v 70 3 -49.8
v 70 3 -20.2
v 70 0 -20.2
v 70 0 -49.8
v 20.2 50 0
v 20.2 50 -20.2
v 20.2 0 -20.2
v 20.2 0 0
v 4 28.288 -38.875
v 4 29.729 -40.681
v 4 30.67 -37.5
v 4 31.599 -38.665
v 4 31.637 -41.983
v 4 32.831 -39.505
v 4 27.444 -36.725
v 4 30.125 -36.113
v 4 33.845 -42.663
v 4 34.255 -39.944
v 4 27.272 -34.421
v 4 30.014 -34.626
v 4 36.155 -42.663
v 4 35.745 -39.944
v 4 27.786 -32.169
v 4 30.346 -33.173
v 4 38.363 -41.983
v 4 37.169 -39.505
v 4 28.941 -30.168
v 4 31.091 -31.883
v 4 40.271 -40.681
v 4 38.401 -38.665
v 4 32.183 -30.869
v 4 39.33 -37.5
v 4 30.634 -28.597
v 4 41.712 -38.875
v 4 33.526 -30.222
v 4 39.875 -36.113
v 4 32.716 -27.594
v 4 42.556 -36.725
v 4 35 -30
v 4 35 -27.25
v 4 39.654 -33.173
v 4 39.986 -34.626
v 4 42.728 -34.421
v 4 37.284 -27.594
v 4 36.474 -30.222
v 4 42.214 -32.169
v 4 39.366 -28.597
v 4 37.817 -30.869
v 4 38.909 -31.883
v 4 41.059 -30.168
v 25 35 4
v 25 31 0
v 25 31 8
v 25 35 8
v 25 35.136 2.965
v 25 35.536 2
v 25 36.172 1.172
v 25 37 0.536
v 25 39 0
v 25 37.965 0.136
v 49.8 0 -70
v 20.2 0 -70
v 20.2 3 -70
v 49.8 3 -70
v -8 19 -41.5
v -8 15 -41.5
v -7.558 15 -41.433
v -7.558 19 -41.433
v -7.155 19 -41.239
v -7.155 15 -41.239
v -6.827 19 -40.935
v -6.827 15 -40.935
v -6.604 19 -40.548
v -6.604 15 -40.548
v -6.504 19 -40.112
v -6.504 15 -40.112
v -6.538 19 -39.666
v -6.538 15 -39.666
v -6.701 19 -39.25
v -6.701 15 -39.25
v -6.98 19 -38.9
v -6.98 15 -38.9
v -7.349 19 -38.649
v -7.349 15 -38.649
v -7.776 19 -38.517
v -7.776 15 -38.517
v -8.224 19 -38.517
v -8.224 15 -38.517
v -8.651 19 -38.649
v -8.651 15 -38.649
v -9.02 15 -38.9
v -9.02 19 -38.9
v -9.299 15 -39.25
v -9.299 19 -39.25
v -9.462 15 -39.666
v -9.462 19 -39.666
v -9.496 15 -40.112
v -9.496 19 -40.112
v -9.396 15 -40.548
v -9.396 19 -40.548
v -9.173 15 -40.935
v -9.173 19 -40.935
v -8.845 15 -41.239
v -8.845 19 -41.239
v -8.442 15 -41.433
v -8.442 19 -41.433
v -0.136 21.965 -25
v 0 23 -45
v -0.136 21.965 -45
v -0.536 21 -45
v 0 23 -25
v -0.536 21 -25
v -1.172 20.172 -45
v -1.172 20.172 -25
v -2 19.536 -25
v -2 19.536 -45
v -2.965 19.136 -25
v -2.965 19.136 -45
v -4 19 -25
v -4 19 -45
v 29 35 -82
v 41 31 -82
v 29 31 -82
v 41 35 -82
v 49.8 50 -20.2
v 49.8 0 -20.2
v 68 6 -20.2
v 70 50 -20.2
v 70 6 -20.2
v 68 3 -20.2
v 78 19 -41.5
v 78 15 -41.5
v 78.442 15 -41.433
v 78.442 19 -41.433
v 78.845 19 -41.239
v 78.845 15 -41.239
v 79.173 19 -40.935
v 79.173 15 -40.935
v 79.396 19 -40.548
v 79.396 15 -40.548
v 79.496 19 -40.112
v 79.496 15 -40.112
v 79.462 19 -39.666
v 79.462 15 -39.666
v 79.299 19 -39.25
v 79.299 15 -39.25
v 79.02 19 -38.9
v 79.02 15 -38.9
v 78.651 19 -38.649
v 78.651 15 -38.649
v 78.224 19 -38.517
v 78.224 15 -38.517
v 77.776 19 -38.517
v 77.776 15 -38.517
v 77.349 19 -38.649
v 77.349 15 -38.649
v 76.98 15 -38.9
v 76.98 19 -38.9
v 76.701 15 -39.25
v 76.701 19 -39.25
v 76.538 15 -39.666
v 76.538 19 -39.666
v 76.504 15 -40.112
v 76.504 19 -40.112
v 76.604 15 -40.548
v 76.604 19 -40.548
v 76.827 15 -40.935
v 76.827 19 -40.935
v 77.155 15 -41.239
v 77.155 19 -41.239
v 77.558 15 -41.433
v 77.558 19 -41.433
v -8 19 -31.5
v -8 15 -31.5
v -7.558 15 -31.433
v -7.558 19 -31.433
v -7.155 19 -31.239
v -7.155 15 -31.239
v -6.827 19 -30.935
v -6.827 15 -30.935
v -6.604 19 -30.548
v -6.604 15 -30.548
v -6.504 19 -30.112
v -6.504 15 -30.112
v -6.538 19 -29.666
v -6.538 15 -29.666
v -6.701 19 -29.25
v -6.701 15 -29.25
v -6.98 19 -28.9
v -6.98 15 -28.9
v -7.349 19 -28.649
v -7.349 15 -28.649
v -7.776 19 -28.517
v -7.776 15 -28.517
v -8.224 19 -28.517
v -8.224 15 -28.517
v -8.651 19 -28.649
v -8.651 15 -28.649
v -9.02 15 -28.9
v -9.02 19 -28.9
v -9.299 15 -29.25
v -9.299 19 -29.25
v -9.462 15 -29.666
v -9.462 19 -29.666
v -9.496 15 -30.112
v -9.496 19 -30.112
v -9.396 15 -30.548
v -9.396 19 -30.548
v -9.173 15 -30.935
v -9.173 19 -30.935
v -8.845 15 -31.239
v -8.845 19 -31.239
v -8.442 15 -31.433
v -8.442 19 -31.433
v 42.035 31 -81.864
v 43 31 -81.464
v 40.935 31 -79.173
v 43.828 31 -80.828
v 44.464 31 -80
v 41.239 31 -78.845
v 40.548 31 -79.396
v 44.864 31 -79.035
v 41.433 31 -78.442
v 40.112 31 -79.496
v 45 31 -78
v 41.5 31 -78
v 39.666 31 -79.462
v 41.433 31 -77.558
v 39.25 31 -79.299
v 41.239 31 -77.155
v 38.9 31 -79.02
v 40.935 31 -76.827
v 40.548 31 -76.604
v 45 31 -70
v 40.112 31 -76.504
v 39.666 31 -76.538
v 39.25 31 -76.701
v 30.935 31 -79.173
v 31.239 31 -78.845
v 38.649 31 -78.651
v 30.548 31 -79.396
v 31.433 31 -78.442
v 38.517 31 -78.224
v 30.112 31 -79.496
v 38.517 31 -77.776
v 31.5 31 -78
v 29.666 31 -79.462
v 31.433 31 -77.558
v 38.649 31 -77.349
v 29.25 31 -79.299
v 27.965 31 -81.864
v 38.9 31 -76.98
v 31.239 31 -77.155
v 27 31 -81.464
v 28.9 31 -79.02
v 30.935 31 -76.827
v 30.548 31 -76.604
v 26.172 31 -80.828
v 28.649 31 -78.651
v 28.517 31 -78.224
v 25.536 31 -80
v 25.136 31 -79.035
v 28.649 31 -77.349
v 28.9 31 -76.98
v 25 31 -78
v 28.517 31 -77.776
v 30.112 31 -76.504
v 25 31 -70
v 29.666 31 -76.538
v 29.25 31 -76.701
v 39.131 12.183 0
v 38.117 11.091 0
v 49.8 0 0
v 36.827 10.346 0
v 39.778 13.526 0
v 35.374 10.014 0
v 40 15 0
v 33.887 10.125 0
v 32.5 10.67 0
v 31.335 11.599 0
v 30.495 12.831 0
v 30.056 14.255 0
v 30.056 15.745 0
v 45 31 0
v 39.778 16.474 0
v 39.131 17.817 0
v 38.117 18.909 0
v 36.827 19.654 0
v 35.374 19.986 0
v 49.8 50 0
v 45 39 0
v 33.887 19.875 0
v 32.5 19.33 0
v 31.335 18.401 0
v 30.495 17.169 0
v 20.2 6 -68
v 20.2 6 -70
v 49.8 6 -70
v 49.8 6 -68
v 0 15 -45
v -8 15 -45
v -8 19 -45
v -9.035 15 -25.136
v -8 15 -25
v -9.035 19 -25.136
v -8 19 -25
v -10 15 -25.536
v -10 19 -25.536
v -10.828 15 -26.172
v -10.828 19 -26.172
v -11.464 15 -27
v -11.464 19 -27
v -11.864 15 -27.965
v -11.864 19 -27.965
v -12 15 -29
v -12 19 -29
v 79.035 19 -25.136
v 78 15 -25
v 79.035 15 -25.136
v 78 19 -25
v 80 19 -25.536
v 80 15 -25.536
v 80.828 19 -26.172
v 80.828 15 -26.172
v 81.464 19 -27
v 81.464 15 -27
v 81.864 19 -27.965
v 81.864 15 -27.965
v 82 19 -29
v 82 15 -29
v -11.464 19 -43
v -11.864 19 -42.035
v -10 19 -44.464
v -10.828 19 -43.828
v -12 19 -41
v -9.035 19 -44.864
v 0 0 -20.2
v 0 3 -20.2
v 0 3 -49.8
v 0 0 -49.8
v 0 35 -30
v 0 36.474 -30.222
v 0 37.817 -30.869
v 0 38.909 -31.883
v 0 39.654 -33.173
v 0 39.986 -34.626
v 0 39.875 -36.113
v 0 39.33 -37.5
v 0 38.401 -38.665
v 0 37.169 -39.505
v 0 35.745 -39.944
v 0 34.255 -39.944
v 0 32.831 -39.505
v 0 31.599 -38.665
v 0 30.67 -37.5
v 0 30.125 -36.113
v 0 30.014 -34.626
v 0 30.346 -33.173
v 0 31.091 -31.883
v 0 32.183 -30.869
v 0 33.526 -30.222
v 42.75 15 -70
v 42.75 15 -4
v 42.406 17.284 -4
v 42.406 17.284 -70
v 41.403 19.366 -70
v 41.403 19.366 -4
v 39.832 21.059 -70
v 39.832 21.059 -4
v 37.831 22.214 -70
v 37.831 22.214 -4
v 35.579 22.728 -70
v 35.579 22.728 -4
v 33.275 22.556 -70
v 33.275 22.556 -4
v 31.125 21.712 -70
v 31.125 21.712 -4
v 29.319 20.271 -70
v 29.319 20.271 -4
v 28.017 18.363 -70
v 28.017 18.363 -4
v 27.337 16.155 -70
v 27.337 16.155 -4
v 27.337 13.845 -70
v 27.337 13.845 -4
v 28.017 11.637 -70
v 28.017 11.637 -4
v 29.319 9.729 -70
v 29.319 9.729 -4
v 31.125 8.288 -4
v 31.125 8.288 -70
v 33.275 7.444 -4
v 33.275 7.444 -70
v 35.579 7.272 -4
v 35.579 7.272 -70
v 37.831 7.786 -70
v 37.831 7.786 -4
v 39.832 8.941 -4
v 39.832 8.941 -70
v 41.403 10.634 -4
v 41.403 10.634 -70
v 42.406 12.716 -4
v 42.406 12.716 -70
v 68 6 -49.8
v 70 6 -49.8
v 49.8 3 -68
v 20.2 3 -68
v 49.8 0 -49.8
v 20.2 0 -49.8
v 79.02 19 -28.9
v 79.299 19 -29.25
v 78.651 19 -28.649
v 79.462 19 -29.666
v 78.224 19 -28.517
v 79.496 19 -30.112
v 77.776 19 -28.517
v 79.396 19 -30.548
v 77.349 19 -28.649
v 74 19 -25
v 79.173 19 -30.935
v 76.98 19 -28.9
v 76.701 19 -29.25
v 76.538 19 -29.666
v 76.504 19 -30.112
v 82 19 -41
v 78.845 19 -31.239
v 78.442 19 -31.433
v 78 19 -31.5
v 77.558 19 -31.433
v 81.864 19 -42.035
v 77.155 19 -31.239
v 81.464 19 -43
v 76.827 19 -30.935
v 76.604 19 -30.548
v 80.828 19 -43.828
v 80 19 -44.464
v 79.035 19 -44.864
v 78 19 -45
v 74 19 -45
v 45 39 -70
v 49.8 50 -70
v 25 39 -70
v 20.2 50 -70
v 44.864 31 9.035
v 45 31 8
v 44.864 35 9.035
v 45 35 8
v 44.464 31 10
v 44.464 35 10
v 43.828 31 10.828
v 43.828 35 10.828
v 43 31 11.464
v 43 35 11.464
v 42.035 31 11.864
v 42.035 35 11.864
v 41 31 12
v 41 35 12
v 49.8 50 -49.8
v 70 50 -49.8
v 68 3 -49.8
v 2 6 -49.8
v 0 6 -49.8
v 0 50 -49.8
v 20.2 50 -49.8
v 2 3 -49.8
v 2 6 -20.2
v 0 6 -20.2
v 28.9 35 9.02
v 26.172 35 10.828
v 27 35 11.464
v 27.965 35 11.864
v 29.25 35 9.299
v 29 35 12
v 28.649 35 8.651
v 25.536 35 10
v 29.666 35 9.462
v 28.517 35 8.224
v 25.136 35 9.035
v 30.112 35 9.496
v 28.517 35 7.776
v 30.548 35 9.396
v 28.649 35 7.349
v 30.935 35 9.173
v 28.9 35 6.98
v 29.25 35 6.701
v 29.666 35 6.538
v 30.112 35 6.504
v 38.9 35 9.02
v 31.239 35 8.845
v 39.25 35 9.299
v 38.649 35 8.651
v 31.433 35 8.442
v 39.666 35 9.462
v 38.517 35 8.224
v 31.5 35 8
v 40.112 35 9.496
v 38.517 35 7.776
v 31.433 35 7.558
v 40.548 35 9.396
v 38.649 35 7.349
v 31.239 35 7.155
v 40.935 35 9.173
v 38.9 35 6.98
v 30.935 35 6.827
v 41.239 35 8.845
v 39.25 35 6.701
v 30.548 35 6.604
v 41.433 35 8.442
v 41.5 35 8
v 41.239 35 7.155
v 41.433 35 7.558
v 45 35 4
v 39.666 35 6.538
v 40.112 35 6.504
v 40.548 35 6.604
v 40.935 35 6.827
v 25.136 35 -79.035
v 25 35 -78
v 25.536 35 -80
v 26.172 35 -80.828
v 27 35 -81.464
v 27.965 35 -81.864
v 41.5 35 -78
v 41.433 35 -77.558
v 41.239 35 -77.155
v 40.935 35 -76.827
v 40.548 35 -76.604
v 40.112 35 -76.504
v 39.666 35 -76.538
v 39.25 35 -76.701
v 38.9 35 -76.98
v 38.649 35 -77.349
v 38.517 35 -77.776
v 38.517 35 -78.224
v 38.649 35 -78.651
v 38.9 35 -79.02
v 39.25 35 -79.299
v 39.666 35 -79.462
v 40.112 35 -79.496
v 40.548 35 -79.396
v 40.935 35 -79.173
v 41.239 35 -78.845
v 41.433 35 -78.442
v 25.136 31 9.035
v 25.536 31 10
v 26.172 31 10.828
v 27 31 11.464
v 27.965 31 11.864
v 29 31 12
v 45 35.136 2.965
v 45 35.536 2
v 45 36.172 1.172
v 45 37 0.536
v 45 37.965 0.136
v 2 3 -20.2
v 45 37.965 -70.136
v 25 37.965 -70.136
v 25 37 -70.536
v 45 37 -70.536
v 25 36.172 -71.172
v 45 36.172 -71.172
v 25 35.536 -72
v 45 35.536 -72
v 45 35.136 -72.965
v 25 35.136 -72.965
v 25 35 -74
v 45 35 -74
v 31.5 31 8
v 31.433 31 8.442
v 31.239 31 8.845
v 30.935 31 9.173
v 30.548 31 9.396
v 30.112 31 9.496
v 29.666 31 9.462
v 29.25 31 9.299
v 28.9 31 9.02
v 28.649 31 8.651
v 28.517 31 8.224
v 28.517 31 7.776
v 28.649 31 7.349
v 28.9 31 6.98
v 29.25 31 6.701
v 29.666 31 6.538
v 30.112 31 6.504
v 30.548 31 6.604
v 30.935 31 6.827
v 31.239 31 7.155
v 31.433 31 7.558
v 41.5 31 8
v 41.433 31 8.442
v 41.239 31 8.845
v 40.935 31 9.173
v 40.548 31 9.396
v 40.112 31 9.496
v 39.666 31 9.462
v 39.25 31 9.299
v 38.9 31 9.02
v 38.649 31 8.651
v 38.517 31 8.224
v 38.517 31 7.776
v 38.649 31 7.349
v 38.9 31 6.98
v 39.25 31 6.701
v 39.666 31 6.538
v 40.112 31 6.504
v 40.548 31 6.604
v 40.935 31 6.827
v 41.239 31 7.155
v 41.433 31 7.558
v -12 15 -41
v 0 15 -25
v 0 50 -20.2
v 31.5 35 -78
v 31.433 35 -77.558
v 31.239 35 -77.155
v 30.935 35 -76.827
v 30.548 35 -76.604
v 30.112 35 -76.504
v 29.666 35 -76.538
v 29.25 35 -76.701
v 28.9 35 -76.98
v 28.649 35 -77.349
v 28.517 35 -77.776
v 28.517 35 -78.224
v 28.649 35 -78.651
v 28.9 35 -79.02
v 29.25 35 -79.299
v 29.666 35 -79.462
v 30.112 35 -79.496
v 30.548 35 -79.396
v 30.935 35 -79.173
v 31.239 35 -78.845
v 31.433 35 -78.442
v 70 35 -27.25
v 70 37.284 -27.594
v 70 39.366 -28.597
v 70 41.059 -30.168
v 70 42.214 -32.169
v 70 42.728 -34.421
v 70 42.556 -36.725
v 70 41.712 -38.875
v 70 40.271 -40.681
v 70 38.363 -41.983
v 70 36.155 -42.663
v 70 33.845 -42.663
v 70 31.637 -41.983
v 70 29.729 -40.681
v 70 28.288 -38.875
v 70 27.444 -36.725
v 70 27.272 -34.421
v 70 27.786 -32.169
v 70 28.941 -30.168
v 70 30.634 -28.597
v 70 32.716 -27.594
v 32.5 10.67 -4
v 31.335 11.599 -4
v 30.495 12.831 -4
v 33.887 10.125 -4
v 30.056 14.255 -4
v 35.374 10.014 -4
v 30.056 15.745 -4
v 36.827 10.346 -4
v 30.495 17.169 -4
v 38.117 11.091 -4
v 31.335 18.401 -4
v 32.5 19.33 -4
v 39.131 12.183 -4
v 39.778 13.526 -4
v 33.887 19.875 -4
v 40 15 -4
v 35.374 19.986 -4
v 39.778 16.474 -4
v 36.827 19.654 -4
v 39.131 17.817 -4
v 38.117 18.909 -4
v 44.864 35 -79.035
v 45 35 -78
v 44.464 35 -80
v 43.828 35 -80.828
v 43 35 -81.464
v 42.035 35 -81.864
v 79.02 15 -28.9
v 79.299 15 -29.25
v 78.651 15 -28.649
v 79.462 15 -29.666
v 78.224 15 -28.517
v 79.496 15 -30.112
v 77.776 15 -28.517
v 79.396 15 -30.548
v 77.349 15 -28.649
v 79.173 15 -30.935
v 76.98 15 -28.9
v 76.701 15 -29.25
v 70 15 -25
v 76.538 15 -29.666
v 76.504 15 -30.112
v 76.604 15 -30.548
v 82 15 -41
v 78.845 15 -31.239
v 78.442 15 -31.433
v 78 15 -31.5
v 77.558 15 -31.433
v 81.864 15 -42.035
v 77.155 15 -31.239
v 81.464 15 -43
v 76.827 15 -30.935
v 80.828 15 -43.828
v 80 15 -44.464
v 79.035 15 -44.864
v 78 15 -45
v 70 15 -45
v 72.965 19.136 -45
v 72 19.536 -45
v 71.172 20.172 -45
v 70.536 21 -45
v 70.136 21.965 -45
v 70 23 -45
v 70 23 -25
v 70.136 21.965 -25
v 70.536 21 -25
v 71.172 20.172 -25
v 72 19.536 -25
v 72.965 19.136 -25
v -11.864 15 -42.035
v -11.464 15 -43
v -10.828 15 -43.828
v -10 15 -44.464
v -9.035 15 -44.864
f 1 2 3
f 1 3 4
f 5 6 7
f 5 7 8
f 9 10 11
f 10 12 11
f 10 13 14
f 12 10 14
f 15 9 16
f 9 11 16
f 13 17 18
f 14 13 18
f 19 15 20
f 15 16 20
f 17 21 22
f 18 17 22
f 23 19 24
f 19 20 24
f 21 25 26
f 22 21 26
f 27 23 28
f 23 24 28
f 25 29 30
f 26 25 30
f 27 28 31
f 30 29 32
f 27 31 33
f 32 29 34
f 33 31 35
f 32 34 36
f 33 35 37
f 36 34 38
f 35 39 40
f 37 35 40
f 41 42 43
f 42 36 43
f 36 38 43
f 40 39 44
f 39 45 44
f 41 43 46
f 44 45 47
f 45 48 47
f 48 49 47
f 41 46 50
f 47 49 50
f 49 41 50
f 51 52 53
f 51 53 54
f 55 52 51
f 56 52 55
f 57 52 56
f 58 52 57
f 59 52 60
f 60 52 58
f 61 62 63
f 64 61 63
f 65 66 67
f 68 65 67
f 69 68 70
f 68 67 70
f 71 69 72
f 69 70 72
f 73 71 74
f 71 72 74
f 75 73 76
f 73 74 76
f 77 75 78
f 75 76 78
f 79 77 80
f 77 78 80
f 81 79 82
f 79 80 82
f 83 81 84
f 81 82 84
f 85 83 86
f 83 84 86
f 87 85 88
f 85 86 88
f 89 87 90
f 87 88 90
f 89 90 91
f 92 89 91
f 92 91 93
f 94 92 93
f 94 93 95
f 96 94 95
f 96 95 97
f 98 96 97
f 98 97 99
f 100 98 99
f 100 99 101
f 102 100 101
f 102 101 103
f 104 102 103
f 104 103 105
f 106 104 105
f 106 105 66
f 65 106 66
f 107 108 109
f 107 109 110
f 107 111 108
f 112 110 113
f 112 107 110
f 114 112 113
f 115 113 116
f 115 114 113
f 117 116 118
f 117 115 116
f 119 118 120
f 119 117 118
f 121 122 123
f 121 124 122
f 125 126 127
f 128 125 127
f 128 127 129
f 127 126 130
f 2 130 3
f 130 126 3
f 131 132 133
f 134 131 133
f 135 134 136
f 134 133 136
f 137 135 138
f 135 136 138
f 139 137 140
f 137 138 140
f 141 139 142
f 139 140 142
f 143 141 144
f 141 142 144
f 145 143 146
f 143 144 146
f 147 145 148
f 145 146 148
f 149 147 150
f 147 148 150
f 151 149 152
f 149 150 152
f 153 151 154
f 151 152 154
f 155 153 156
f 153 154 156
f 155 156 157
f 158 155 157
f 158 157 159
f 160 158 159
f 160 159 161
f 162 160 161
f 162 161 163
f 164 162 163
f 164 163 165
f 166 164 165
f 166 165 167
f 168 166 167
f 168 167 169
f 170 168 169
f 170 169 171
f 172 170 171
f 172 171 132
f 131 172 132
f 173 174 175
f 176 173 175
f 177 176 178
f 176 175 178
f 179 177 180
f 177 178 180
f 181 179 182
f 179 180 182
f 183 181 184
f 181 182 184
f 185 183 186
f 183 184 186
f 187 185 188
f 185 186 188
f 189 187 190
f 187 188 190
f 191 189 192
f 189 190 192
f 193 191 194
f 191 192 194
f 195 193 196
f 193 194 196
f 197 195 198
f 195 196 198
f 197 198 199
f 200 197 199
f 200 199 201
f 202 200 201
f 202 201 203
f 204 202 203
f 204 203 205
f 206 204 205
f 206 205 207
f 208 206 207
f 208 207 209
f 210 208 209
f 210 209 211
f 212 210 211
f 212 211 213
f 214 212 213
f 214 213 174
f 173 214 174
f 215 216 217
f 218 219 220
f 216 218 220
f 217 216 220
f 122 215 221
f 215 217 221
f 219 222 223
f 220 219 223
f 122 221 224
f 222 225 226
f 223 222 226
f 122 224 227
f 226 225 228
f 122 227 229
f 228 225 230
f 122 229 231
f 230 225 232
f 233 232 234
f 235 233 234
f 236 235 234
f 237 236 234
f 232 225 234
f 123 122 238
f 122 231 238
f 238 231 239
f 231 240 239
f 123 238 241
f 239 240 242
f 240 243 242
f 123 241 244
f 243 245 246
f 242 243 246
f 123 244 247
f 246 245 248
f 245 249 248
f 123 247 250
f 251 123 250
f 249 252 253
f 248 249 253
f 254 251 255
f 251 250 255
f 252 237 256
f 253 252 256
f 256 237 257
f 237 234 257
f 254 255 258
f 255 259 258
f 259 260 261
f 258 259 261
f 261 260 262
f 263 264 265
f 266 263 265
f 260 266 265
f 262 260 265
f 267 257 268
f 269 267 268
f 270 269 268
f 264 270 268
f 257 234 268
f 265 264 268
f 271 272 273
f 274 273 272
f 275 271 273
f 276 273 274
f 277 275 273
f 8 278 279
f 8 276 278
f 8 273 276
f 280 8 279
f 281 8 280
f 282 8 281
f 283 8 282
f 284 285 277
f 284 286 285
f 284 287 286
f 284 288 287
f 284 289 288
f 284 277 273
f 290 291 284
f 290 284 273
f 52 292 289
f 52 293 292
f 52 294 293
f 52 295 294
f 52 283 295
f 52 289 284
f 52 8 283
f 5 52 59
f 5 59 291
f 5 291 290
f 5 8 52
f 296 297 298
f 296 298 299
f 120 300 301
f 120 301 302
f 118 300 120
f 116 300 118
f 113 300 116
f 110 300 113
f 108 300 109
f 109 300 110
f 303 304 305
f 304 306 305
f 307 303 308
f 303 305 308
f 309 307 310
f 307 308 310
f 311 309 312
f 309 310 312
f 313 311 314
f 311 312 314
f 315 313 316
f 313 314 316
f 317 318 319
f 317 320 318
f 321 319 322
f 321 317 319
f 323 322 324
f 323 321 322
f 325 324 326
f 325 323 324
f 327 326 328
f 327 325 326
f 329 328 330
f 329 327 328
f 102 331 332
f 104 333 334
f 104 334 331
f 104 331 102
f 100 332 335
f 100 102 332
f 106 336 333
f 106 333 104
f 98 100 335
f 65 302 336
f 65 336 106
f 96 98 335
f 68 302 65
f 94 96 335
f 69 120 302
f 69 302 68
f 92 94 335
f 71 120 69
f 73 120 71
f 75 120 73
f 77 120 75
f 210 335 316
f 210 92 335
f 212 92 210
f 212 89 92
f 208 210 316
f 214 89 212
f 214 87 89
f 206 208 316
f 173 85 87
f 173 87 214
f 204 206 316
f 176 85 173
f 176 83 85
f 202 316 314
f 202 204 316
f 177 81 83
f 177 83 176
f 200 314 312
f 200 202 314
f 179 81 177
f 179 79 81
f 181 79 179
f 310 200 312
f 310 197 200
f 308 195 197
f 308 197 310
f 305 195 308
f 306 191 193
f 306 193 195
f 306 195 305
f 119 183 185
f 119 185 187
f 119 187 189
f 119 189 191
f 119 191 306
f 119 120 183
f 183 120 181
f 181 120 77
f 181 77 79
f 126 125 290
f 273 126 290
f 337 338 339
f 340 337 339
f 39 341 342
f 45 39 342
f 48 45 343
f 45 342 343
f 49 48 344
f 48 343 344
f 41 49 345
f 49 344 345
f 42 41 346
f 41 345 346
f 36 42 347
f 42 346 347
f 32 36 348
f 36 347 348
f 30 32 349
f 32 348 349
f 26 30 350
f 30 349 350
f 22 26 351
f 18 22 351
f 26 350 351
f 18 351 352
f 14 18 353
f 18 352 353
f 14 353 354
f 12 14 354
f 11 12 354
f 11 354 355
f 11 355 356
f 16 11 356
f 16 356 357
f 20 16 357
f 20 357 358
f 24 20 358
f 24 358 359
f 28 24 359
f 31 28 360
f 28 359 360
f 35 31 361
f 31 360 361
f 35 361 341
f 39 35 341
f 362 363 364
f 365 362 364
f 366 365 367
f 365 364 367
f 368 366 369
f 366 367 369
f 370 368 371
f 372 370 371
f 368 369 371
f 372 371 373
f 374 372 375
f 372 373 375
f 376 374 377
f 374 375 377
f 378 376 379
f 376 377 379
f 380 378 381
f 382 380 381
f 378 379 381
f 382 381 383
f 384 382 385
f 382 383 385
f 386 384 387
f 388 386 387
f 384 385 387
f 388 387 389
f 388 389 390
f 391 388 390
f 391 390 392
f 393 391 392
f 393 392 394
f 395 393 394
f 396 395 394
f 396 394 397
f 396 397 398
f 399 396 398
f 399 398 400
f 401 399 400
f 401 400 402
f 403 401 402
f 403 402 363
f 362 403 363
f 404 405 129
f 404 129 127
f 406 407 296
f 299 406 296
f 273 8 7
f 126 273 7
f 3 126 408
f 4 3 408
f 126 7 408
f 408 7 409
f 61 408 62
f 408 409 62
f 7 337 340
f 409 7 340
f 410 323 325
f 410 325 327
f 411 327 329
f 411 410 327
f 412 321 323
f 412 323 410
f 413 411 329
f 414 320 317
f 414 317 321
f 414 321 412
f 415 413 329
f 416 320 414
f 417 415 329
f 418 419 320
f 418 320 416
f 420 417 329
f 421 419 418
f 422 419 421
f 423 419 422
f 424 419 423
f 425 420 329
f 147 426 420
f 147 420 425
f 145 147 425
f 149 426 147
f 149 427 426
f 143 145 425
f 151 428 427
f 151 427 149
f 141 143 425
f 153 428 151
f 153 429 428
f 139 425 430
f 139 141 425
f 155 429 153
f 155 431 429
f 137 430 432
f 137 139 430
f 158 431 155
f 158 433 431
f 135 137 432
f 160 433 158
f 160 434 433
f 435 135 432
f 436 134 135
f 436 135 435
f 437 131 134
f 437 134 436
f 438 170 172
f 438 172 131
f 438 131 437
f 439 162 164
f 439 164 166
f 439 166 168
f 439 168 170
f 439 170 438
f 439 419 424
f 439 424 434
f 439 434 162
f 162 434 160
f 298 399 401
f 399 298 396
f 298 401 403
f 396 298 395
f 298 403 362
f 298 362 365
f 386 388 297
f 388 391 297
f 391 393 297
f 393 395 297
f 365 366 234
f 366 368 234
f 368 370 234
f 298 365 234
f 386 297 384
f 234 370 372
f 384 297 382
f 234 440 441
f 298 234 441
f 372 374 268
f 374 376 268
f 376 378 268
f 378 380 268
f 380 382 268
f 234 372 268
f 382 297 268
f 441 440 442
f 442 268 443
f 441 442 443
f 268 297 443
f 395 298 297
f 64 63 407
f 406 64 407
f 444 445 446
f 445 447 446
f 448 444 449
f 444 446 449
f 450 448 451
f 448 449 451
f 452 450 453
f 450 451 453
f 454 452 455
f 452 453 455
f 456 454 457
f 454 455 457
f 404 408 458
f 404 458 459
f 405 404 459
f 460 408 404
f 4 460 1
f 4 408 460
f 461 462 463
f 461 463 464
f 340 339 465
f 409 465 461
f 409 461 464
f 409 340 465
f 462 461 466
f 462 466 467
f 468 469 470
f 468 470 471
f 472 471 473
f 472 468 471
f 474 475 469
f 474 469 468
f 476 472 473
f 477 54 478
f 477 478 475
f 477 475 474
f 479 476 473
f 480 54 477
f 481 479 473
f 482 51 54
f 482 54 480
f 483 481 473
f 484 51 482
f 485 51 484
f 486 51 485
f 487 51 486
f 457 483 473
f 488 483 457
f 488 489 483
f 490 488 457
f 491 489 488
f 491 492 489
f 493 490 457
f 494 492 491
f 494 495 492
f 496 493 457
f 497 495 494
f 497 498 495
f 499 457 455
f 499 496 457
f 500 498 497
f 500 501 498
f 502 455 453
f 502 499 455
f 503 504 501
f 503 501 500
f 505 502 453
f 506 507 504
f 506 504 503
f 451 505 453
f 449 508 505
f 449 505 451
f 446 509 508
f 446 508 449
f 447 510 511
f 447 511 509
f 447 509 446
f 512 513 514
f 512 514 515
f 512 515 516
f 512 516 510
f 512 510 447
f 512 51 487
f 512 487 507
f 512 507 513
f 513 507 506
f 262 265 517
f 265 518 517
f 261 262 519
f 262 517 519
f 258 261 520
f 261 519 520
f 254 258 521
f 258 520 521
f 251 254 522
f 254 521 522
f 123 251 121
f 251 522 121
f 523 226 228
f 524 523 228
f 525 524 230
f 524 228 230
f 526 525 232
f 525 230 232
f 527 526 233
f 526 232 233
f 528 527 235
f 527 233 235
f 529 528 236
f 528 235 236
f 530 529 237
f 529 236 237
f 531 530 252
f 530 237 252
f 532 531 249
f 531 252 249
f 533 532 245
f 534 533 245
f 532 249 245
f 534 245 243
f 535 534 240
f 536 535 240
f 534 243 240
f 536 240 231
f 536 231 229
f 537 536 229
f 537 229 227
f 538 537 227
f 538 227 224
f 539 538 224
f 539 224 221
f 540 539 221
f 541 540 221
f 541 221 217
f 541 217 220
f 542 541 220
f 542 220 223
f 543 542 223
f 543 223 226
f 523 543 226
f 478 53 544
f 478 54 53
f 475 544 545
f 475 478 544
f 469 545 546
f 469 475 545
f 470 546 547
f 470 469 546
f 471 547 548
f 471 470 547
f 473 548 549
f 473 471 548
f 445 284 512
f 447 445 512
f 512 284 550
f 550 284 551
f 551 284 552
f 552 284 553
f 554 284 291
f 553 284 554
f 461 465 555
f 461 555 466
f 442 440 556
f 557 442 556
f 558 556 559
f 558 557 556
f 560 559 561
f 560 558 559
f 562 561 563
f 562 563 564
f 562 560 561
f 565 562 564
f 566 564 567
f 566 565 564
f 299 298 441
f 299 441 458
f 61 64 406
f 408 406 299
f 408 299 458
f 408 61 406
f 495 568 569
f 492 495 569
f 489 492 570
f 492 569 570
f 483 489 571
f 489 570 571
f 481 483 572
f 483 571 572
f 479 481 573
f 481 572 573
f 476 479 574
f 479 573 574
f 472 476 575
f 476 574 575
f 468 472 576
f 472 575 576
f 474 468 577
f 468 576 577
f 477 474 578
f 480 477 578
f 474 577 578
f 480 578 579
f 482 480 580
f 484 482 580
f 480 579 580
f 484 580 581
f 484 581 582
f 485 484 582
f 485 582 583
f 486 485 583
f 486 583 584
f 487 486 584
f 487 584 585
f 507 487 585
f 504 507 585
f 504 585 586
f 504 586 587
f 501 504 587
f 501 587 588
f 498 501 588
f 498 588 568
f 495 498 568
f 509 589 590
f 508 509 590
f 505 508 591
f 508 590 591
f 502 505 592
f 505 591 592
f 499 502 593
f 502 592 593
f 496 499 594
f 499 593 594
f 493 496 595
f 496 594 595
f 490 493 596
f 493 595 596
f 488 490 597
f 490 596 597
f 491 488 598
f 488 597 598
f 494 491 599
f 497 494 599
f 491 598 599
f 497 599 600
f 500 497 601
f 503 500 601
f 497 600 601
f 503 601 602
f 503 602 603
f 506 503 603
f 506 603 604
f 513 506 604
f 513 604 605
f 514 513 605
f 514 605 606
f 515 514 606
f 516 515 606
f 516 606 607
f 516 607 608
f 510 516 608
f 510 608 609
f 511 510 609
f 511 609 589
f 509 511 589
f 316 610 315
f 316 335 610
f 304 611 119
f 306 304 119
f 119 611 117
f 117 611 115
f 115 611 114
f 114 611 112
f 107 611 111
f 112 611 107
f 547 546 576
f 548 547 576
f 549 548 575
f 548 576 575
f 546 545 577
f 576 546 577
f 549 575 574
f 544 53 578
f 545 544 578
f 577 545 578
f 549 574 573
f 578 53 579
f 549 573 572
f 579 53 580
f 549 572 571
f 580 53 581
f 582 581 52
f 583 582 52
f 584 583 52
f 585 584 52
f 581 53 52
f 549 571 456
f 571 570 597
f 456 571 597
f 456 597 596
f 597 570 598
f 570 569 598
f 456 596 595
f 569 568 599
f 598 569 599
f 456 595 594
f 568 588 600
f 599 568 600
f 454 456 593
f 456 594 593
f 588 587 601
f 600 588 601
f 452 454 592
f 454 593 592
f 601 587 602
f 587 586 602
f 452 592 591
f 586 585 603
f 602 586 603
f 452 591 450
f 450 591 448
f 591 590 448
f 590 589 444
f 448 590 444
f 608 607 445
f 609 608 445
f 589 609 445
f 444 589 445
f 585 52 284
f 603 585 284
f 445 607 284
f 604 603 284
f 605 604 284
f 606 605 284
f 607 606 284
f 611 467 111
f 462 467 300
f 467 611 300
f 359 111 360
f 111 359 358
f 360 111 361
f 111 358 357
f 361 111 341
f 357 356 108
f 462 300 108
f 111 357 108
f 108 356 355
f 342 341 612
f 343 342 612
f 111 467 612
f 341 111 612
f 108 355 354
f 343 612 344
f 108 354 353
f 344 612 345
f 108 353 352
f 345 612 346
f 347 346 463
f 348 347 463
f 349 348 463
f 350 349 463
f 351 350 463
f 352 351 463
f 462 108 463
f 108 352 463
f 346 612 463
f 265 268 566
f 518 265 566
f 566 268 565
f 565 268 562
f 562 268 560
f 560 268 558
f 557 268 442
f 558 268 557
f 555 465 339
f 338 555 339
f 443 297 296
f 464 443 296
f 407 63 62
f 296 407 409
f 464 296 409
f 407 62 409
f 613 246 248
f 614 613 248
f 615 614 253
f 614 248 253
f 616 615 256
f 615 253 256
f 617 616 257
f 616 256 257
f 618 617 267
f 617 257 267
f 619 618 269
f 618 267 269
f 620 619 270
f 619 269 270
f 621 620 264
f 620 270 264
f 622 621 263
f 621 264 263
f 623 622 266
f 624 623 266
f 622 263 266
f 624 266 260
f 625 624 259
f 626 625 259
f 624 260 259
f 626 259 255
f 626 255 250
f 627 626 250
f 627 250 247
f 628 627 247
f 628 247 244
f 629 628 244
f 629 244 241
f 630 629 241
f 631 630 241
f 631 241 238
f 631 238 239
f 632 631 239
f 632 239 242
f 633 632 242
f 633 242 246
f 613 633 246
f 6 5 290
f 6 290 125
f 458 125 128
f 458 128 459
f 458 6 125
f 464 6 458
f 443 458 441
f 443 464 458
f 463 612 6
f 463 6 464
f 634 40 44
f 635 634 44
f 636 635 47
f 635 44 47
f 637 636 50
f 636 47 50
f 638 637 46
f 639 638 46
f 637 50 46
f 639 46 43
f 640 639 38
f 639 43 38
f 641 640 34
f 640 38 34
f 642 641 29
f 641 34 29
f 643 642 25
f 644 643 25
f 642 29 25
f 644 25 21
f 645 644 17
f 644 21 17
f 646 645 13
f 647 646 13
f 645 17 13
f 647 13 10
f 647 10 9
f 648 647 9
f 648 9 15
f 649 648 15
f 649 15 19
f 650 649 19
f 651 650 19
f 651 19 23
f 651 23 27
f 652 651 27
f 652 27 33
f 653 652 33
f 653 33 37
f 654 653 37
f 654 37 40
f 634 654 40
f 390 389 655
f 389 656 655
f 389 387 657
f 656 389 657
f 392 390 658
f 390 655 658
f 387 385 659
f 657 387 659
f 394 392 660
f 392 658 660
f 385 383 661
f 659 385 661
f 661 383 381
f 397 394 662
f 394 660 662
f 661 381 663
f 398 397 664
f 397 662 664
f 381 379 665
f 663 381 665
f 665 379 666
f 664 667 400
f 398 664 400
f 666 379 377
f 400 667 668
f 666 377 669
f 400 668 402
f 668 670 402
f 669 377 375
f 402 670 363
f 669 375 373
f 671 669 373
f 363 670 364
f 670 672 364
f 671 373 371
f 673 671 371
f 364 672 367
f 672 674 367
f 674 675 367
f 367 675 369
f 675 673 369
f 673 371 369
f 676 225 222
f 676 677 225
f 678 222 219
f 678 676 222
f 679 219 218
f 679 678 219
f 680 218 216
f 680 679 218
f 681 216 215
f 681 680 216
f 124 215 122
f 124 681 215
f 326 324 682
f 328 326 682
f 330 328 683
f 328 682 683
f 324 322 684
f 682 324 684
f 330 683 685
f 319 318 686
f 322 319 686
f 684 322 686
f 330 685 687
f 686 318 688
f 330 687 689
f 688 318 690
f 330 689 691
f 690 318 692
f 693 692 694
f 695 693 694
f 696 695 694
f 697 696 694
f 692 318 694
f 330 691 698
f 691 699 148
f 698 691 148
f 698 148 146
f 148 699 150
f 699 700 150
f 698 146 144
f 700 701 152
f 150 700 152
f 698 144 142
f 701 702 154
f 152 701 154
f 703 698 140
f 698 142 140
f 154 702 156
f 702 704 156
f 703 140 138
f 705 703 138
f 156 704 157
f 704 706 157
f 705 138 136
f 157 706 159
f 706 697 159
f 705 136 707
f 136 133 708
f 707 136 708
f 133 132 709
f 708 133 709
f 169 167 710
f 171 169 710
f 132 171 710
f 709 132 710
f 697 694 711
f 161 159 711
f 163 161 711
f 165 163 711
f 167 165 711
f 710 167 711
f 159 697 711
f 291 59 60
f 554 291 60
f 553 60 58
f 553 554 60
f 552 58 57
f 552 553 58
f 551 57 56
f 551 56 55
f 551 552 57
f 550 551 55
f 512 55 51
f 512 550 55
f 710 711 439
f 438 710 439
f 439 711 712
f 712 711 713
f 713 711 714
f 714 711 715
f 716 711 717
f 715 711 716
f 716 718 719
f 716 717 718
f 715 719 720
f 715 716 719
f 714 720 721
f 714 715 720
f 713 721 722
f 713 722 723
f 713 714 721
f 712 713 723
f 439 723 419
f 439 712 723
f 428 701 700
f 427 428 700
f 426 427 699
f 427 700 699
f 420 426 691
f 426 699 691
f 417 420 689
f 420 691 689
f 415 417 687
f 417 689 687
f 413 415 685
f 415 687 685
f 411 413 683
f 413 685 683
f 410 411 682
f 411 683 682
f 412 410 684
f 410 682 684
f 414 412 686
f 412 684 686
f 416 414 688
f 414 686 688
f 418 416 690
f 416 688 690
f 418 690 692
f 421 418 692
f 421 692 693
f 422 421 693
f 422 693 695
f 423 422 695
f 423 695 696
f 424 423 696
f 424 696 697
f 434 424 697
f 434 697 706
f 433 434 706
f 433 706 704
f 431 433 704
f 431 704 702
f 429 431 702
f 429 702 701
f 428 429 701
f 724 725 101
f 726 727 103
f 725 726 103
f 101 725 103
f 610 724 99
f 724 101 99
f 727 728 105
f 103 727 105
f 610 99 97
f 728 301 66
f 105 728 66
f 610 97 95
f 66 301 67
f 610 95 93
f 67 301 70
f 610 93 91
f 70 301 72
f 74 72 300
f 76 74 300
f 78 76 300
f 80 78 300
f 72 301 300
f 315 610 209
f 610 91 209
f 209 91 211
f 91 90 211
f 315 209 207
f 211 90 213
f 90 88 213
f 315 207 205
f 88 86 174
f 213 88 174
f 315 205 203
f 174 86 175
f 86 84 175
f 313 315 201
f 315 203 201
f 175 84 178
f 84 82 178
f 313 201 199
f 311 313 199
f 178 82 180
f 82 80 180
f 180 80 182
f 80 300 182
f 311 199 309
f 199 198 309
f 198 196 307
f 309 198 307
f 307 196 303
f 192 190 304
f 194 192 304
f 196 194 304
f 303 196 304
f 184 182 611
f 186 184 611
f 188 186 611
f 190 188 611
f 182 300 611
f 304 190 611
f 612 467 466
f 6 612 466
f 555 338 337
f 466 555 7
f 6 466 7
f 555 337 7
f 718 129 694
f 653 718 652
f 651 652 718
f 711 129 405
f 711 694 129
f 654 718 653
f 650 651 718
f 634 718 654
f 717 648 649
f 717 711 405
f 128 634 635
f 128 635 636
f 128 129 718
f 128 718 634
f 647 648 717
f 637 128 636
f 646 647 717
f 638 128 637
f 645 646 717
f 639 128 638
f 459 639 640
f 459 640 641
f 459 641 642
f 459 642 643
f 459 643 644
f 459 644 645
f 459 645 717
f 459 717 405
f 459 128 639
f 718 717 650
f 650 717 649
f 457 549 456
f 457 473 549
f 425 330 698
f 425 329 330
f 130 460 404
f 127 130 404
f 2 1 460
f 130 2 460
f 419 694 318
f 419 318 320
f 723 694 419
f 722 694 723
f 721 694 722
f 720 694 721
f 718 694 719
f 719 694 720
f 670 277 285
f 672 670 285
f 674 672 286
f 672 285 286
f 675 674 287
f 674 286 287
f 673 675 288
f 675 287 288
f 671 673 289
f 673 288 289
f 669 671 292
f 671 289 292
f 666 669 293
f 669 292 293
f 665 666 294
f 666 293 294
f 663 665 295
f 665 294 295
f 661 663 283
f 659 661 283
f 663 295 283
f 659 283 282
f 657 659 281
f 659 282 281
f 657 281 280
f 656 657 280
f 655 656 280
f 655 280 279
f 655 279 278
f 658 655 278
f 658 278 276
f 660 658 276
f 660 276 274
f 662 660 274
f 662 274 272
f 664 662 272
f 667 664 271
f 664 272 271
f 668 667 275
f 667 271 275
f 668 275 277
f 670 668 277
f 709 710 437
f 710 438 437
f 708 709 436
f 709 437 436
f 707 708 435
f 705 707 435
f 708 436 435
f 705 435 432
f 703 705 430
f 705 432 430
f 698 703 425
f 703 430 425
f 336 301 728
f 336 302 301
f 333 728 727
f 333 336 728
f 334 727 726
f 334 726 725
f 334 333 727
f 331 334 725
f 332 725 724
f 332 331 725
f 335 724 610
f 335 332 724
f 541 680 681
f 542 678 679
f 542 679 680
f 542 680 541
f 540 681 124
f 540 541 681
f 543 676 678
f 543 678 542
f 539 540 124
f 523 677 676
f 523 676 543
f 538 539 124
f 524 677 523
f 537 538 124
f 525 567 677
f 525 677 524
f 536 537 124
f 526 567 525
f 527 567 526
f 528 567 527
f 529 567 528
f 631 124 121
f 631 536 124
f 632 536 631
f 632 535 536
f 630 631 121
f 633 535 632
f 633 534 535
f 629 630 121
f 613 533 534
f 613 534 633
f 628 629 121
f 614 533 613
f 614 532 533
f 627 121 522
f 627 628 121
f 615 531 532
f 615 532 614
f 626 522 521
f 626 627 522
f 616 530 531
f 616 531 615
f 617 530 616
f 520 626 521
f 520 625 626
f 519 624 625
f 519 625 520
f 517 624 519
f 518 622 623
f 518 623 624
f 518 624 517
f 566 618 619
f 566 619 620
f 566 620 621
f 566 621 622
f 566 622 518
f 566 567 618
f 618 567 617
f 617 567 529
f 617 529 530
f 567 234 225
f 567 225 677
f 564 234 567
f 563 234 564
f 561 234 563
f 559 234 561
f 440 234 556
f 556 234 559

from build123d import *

# Parameters (mm, degrees)
ESQUISSE1_W              = 70
ESQUISSE1_H              = 50
BOSS_EXTRU_1_DEPTH       = 70
ESQUISSE2_R              = 7.75
ENL_V_MAT_EXTRU_1_DEPTH  = 71
ESQUISSE3_R              = 7.75
ENL_V_MAT_EXTRU_2_DEPTH  = 71
ESQUISSE4_W              = 20.2
ESQUISSE4_H              = 20.2
ENL_V_MAT_EXTRU_3_DEPTH  = 51
ESQUISSE7_R              = 11.73674641
ESQUISSE7_R_2            = 5
BOSS_EXTRU_3_DEPTH       = 4
ESQUISSE8_R              = 12.196693844
ESQUISSE8_R_2            = 5
BOSS_EXTRU_4_DEPTH       = 4
ESQUISSE9_W              = 2
ESQUISSE9_H              = 3
ENL_V_MAT_EXTRU_4_DEPTH  = 50.8
ESQUISSE10_W             = 2
ESQUISSE10_H             = 3
ENL_V_MAT_EXTRU_5_DEPTH  = 50.8
ESQUISSE11_W             = 2
ESQUISSE11_H             = 3
ENL_V_MAT_EXTRU_6_DEPTH  = 50.8
ESQUISSE12_W             = 20
ESQUISSE12_H             = 4
BOSS_EXTRU_5_DEPTH       = 12
ESQUISSE13_R             = 1.5
ENL_V_MAT_EXTRU_7_DEPTH  = 36
CONG_1_R                 = 4
ESQUISSE14_W             = 20
ESQUISSE14_H             = 4
BOSS_EXTRU_6_DEPTH       = 12
ESQUISSE15_R             = 1.5
ENL_V_MAT_EXTRU_8_DEPTH  = 36
CONG_3_R                 = 4
ESQUISSE16_W             = 20
ESQUISSE16_H             = 4
BOSS_EXTRU_7_DEPTH       = 12
ESQUISSE17_R             = 1.5
ENL_V_MAT_EXTRU_9_DEPTH  = 20
CONG_4_R                 = 4
ESQUISSE18_W             = 20
ESQUISSE18_H             = 4
BOSS_EXTRU_8_DEPTH       = 12
ESQUISSE19_R             = 1.5
ENL_V_MAT_EXTRU_10_DEPTH = 20
CONG_5_R                 = 4
CONG_6_R                 = 4


with BuildPart() as part:
    # Esquisse1 → Boss.-Extru.1 (new body)
    with BuildSketch(Plane(origin=(0, 0, 0), x_dir=(0, 0, -1), z_dir=(1, 0, 0))):
        with Locations((35, 25)):
            Rectangle(ESQUISSE1_W, ESQUISSE1_H)
    extrude(amount=BOSS_EXTRU_1_DEPTH)

    # Esquisse2 → Enlèv. mat.-Extru.1 (cut, through all)
    with BuildSketch(Plane.XY):
        with Locations((35, 15)):
            Circle(ESQUISSE2_R)
    extrude(amount=-ENL_V_MAT_EXTRU_1_DEPTH, mode=Mode.SUBTRACT)

    # Esquisse3 → Enlèv. mat.-Extru.2 (cut, through all)
    with BuildSketch(Plane.ZY):
        with Locations((-35, 35)):
            Circle(ESQUISSE3_R)
    extrude(amount=-ENL_V_MAT_EXTRU_2_DEPTH, mode=Mode.SUBTRACT)

    # Esquisse4 → Enlèv. mat.-Extru.3 (cut, through all)
    with BuildSketch(Plane.XZ):
        with Locations((10.1, -59.9)):
            Rectangle(ESQUISSE4_W, ESQUISSE4_H)
        with Locations((10.1, -10.1)):
            Rectangle(ESQUISSE4_W, ESQUISSE4_H)
        with Locations((59.9, -10.1)):
            Rectangle(ESQUISSE4_W, ESQUISSE4_H)
        with Locations((59.9, -59.9)):
            Rectangle(ESQUISSE4_W, ESQUISSE4_H)
    extrude(amount=-ENL_V_MAT_EXTRU_3_DEPTH, mode=Mode.SUBTRACT)

    # Esquisse7 → Boss.-Extru.3 (add)
    with BuildSketch(Plane.XY):
        with Locations((35, 15)):
            Circle(ESQUISSE7_R)
        with Locations((35, 15)):
            Circle(ESQUISSE7_R_2, mode=Mode.SUBTRACT)
    extrude(amount=-BOSS_EXTRU_3_DEPTH)

    # Esquisse8 → Boss.-Extru.4 (add)
    with BuildSketch(Plane.ZY):
        with Locations((-35, 35)):
            Circle(ESQUISSE8_R)
        with Locations((-35, 35)):
            Circle(ESQUISSE8_R_2, mode=Mode.SUBTRACT)
    extrude(amount=-BOSS_EXTRU_4_DEPTH)

    # Esquisse9 → Enlèv. mat.-Extru.4 (cut, through all)
    with BuildSketch(Plane.ZY.offset(-20.2)):
        with Locations((-69, 4.5)):
            Rectangle(ESQUISSE9_W, ESQUISSE9_H)
    extrude(amount=-ENL_V_MAT_EXTRU_4_DEPTH, mode=Mode.SUBTRACT)

    # Esquisse10 → Enlèv. mat.-Extru.5 (cut, through all)
    with BuildSketch(Plane(origin=(0, 0, -49.8), x_dir=(-1, 0, 0), z_dir=(0, 0, -1))):
        with Locations((-1, 4.5)):
            Rectangle(ESQUISSE10_W, ESQUISSE10_H)
    extrude(amount=-ENL_V_MAT_EXTRU_5_DEPTH, mode=Mode.SUBTRACT)

    # Esquisse11 → Enlèv. mat.-Extru.6 (cut, through all)
    with BuildSketch(Plane(origin=(0, 0, -49.8), x_dir=(-1, 0, 0), z_dir=(0, 0, -1))):
        with Locations((-69, 4.5)):
            Rectangle(ESQUISSE11_W, ESQUISSE11_H)
    extrude(amount=-ENL_V_MAT_EXTRU_6_DEPTH, mode=Mode.SUBTRACT)

    # Esquisse12 → Boss.-Extru.5 (add)
    with BuildSketch(Plane.ZY):
        with Locations((-35, 17)):
            Rectangle(ESQUISSE12_W, ESQUISSE12_H)
    extrude(amount=BOSS_EXTRU_5_DEPTH)

    # Esquisse13 → Enlèv. mat.-Extru.7 (cut, through all)
    with BuildSketch(Plane.XZ.offset(-15)):
        with Locations(Location((-8, -30, 0), (0, 0, 270))):  # turned: the seam where the file's is
            Circle(ESQUISSE13_R)
        with Locations(Location((-8, -40, 0), (0, 0, 270))):  # turned: the seam where the file's is
            Circle(ESQUISSE13_R)
    extrude(amount=-ENL_V_MAT_EXTRU_7_DEPTH, mode=Mode.SUBTRACT)

    # Congé1
    cong_1_edges = [part.edges().sort_by_distance(p)[0] for p in [
        (-12, 17, -25),
        (-12, 17, -45),
    ]]
    fillet(cong_1_edges, radius=CONG_1_R)

    # Esquisse14 → Boss.-Extru.6 (add)
    with BuildSketch(Plane(origin=(70, 0, 0), x_dir=(0, 0, -1), z_dir=(1, 0, 0))):
        with Locations((35, 17)):
            Rectangle(ESQUISSE14_W, ESQUISSE14_H)
    extrude(amount=BOSS_EXTRU_6_DEPTH)

    # Esquisse15 → Enlèv. mat.-Extru.8 (cut, through all)
    with BuildSketch(Plane.XZ.offset(-15)):
        with Locations(Location((78, -40, 0), (0, 0, 270))):  # turned: the seam where the file's is
            Circle(ESQUISSE15_R)
        with Locations(Location((78, -30, 0), (0, 0, 270))):  # turned: the seam where the file's is
            Circle(ESQUISSE15_R)
    extrude(amount=-ENL_V_MAT_EXTRU_8_DEPTH, mode=Mode.SUBTRACT)

    # Congé3
    cong_3_edges = [part.edges().sort_by_distance(p)[0] for p in [
        (82, 17, -45),
        (82, 17, -25),
    ]]
    fillet(cong_3_edges, radius=CONG_3_R)

    # Esquisse16 → Boss.-Extru.7 (add)
    with BuildSketch(Plane.XY):
        with Locations((35, 33)):
            Rectangle(ESQUISSE16_W, ESQUISSE16_H)
    extrude(amount=BOSS_EXTRU_7_DEPTH)

    # Esquisse17 → Enlèv. mat.-Extru.9 (cut, through all)
    with BuildSketch(Plane.XZ.offset(-31)):
        with Locations((40, 8)):
            Circle(ESQUISSE17_R)
        with Locations((30, 8)):
            Circle(ESQUISSE17_R)
    extrude(amount=-ENL_V_MAT_EXTRU_9_DEPTH, mode=Mode.SUBTRACT)

    # Congé4
    cong_4_edges = [part.edges().sort_by_distance(p)[0] for p in [
        (45, 33, 12),
        (25, 33, 12),
    ]]
    fillet(cong_4_edges, radius=CONG_4_R)

    # Esquisse18 → Boss.-Extru.8 (add)
    with BuildSketch(Plane(origin=(0, 0, -70), x_dir=(-1, 0, 0), z_dir=(0, 0, -1))):
        with Locations((-35, 33)):
            Rectangle(ESQUISSE18_W, ESQUISSE18_H)
    extrude(amount=BOSS_EXTRU_8_DEPTH)

    # Esquisse19 → Enlèv. mat.-Extru.10 (cut, through all)
    with BuildSketch(Plane.XZ.offset(-31)):
        with Locations((30, -78)):
            Circle(ESQUISSE19_R)
        with Locations((40, -78)):
            Circle(ESQUISSE19_R)
    extrude(amount=-ENL_V_MAT_EXTRU_10_DEPTH, mode=Mode.SUBTRACT)

    # Congé5
    cong_5_edges = [part.edges().sort_by_distance(p)[0] for p in [
        (25, 33, -82),
        (45, 33, -82),
    ]]
    fillet(cong_5_edges, radius=CONG_5_R)

    # Congé6
    cong_6_edges = [part.edges().sort_by_distance(p)[0] for p in [
        (0, 19, -35),
        (70, 19, -35),
        (35, 35, 0),
        (35, 35, -70),
    ]]
    fillet(cong_6_edges, radius=CONG_6_R)


solid = part.part
